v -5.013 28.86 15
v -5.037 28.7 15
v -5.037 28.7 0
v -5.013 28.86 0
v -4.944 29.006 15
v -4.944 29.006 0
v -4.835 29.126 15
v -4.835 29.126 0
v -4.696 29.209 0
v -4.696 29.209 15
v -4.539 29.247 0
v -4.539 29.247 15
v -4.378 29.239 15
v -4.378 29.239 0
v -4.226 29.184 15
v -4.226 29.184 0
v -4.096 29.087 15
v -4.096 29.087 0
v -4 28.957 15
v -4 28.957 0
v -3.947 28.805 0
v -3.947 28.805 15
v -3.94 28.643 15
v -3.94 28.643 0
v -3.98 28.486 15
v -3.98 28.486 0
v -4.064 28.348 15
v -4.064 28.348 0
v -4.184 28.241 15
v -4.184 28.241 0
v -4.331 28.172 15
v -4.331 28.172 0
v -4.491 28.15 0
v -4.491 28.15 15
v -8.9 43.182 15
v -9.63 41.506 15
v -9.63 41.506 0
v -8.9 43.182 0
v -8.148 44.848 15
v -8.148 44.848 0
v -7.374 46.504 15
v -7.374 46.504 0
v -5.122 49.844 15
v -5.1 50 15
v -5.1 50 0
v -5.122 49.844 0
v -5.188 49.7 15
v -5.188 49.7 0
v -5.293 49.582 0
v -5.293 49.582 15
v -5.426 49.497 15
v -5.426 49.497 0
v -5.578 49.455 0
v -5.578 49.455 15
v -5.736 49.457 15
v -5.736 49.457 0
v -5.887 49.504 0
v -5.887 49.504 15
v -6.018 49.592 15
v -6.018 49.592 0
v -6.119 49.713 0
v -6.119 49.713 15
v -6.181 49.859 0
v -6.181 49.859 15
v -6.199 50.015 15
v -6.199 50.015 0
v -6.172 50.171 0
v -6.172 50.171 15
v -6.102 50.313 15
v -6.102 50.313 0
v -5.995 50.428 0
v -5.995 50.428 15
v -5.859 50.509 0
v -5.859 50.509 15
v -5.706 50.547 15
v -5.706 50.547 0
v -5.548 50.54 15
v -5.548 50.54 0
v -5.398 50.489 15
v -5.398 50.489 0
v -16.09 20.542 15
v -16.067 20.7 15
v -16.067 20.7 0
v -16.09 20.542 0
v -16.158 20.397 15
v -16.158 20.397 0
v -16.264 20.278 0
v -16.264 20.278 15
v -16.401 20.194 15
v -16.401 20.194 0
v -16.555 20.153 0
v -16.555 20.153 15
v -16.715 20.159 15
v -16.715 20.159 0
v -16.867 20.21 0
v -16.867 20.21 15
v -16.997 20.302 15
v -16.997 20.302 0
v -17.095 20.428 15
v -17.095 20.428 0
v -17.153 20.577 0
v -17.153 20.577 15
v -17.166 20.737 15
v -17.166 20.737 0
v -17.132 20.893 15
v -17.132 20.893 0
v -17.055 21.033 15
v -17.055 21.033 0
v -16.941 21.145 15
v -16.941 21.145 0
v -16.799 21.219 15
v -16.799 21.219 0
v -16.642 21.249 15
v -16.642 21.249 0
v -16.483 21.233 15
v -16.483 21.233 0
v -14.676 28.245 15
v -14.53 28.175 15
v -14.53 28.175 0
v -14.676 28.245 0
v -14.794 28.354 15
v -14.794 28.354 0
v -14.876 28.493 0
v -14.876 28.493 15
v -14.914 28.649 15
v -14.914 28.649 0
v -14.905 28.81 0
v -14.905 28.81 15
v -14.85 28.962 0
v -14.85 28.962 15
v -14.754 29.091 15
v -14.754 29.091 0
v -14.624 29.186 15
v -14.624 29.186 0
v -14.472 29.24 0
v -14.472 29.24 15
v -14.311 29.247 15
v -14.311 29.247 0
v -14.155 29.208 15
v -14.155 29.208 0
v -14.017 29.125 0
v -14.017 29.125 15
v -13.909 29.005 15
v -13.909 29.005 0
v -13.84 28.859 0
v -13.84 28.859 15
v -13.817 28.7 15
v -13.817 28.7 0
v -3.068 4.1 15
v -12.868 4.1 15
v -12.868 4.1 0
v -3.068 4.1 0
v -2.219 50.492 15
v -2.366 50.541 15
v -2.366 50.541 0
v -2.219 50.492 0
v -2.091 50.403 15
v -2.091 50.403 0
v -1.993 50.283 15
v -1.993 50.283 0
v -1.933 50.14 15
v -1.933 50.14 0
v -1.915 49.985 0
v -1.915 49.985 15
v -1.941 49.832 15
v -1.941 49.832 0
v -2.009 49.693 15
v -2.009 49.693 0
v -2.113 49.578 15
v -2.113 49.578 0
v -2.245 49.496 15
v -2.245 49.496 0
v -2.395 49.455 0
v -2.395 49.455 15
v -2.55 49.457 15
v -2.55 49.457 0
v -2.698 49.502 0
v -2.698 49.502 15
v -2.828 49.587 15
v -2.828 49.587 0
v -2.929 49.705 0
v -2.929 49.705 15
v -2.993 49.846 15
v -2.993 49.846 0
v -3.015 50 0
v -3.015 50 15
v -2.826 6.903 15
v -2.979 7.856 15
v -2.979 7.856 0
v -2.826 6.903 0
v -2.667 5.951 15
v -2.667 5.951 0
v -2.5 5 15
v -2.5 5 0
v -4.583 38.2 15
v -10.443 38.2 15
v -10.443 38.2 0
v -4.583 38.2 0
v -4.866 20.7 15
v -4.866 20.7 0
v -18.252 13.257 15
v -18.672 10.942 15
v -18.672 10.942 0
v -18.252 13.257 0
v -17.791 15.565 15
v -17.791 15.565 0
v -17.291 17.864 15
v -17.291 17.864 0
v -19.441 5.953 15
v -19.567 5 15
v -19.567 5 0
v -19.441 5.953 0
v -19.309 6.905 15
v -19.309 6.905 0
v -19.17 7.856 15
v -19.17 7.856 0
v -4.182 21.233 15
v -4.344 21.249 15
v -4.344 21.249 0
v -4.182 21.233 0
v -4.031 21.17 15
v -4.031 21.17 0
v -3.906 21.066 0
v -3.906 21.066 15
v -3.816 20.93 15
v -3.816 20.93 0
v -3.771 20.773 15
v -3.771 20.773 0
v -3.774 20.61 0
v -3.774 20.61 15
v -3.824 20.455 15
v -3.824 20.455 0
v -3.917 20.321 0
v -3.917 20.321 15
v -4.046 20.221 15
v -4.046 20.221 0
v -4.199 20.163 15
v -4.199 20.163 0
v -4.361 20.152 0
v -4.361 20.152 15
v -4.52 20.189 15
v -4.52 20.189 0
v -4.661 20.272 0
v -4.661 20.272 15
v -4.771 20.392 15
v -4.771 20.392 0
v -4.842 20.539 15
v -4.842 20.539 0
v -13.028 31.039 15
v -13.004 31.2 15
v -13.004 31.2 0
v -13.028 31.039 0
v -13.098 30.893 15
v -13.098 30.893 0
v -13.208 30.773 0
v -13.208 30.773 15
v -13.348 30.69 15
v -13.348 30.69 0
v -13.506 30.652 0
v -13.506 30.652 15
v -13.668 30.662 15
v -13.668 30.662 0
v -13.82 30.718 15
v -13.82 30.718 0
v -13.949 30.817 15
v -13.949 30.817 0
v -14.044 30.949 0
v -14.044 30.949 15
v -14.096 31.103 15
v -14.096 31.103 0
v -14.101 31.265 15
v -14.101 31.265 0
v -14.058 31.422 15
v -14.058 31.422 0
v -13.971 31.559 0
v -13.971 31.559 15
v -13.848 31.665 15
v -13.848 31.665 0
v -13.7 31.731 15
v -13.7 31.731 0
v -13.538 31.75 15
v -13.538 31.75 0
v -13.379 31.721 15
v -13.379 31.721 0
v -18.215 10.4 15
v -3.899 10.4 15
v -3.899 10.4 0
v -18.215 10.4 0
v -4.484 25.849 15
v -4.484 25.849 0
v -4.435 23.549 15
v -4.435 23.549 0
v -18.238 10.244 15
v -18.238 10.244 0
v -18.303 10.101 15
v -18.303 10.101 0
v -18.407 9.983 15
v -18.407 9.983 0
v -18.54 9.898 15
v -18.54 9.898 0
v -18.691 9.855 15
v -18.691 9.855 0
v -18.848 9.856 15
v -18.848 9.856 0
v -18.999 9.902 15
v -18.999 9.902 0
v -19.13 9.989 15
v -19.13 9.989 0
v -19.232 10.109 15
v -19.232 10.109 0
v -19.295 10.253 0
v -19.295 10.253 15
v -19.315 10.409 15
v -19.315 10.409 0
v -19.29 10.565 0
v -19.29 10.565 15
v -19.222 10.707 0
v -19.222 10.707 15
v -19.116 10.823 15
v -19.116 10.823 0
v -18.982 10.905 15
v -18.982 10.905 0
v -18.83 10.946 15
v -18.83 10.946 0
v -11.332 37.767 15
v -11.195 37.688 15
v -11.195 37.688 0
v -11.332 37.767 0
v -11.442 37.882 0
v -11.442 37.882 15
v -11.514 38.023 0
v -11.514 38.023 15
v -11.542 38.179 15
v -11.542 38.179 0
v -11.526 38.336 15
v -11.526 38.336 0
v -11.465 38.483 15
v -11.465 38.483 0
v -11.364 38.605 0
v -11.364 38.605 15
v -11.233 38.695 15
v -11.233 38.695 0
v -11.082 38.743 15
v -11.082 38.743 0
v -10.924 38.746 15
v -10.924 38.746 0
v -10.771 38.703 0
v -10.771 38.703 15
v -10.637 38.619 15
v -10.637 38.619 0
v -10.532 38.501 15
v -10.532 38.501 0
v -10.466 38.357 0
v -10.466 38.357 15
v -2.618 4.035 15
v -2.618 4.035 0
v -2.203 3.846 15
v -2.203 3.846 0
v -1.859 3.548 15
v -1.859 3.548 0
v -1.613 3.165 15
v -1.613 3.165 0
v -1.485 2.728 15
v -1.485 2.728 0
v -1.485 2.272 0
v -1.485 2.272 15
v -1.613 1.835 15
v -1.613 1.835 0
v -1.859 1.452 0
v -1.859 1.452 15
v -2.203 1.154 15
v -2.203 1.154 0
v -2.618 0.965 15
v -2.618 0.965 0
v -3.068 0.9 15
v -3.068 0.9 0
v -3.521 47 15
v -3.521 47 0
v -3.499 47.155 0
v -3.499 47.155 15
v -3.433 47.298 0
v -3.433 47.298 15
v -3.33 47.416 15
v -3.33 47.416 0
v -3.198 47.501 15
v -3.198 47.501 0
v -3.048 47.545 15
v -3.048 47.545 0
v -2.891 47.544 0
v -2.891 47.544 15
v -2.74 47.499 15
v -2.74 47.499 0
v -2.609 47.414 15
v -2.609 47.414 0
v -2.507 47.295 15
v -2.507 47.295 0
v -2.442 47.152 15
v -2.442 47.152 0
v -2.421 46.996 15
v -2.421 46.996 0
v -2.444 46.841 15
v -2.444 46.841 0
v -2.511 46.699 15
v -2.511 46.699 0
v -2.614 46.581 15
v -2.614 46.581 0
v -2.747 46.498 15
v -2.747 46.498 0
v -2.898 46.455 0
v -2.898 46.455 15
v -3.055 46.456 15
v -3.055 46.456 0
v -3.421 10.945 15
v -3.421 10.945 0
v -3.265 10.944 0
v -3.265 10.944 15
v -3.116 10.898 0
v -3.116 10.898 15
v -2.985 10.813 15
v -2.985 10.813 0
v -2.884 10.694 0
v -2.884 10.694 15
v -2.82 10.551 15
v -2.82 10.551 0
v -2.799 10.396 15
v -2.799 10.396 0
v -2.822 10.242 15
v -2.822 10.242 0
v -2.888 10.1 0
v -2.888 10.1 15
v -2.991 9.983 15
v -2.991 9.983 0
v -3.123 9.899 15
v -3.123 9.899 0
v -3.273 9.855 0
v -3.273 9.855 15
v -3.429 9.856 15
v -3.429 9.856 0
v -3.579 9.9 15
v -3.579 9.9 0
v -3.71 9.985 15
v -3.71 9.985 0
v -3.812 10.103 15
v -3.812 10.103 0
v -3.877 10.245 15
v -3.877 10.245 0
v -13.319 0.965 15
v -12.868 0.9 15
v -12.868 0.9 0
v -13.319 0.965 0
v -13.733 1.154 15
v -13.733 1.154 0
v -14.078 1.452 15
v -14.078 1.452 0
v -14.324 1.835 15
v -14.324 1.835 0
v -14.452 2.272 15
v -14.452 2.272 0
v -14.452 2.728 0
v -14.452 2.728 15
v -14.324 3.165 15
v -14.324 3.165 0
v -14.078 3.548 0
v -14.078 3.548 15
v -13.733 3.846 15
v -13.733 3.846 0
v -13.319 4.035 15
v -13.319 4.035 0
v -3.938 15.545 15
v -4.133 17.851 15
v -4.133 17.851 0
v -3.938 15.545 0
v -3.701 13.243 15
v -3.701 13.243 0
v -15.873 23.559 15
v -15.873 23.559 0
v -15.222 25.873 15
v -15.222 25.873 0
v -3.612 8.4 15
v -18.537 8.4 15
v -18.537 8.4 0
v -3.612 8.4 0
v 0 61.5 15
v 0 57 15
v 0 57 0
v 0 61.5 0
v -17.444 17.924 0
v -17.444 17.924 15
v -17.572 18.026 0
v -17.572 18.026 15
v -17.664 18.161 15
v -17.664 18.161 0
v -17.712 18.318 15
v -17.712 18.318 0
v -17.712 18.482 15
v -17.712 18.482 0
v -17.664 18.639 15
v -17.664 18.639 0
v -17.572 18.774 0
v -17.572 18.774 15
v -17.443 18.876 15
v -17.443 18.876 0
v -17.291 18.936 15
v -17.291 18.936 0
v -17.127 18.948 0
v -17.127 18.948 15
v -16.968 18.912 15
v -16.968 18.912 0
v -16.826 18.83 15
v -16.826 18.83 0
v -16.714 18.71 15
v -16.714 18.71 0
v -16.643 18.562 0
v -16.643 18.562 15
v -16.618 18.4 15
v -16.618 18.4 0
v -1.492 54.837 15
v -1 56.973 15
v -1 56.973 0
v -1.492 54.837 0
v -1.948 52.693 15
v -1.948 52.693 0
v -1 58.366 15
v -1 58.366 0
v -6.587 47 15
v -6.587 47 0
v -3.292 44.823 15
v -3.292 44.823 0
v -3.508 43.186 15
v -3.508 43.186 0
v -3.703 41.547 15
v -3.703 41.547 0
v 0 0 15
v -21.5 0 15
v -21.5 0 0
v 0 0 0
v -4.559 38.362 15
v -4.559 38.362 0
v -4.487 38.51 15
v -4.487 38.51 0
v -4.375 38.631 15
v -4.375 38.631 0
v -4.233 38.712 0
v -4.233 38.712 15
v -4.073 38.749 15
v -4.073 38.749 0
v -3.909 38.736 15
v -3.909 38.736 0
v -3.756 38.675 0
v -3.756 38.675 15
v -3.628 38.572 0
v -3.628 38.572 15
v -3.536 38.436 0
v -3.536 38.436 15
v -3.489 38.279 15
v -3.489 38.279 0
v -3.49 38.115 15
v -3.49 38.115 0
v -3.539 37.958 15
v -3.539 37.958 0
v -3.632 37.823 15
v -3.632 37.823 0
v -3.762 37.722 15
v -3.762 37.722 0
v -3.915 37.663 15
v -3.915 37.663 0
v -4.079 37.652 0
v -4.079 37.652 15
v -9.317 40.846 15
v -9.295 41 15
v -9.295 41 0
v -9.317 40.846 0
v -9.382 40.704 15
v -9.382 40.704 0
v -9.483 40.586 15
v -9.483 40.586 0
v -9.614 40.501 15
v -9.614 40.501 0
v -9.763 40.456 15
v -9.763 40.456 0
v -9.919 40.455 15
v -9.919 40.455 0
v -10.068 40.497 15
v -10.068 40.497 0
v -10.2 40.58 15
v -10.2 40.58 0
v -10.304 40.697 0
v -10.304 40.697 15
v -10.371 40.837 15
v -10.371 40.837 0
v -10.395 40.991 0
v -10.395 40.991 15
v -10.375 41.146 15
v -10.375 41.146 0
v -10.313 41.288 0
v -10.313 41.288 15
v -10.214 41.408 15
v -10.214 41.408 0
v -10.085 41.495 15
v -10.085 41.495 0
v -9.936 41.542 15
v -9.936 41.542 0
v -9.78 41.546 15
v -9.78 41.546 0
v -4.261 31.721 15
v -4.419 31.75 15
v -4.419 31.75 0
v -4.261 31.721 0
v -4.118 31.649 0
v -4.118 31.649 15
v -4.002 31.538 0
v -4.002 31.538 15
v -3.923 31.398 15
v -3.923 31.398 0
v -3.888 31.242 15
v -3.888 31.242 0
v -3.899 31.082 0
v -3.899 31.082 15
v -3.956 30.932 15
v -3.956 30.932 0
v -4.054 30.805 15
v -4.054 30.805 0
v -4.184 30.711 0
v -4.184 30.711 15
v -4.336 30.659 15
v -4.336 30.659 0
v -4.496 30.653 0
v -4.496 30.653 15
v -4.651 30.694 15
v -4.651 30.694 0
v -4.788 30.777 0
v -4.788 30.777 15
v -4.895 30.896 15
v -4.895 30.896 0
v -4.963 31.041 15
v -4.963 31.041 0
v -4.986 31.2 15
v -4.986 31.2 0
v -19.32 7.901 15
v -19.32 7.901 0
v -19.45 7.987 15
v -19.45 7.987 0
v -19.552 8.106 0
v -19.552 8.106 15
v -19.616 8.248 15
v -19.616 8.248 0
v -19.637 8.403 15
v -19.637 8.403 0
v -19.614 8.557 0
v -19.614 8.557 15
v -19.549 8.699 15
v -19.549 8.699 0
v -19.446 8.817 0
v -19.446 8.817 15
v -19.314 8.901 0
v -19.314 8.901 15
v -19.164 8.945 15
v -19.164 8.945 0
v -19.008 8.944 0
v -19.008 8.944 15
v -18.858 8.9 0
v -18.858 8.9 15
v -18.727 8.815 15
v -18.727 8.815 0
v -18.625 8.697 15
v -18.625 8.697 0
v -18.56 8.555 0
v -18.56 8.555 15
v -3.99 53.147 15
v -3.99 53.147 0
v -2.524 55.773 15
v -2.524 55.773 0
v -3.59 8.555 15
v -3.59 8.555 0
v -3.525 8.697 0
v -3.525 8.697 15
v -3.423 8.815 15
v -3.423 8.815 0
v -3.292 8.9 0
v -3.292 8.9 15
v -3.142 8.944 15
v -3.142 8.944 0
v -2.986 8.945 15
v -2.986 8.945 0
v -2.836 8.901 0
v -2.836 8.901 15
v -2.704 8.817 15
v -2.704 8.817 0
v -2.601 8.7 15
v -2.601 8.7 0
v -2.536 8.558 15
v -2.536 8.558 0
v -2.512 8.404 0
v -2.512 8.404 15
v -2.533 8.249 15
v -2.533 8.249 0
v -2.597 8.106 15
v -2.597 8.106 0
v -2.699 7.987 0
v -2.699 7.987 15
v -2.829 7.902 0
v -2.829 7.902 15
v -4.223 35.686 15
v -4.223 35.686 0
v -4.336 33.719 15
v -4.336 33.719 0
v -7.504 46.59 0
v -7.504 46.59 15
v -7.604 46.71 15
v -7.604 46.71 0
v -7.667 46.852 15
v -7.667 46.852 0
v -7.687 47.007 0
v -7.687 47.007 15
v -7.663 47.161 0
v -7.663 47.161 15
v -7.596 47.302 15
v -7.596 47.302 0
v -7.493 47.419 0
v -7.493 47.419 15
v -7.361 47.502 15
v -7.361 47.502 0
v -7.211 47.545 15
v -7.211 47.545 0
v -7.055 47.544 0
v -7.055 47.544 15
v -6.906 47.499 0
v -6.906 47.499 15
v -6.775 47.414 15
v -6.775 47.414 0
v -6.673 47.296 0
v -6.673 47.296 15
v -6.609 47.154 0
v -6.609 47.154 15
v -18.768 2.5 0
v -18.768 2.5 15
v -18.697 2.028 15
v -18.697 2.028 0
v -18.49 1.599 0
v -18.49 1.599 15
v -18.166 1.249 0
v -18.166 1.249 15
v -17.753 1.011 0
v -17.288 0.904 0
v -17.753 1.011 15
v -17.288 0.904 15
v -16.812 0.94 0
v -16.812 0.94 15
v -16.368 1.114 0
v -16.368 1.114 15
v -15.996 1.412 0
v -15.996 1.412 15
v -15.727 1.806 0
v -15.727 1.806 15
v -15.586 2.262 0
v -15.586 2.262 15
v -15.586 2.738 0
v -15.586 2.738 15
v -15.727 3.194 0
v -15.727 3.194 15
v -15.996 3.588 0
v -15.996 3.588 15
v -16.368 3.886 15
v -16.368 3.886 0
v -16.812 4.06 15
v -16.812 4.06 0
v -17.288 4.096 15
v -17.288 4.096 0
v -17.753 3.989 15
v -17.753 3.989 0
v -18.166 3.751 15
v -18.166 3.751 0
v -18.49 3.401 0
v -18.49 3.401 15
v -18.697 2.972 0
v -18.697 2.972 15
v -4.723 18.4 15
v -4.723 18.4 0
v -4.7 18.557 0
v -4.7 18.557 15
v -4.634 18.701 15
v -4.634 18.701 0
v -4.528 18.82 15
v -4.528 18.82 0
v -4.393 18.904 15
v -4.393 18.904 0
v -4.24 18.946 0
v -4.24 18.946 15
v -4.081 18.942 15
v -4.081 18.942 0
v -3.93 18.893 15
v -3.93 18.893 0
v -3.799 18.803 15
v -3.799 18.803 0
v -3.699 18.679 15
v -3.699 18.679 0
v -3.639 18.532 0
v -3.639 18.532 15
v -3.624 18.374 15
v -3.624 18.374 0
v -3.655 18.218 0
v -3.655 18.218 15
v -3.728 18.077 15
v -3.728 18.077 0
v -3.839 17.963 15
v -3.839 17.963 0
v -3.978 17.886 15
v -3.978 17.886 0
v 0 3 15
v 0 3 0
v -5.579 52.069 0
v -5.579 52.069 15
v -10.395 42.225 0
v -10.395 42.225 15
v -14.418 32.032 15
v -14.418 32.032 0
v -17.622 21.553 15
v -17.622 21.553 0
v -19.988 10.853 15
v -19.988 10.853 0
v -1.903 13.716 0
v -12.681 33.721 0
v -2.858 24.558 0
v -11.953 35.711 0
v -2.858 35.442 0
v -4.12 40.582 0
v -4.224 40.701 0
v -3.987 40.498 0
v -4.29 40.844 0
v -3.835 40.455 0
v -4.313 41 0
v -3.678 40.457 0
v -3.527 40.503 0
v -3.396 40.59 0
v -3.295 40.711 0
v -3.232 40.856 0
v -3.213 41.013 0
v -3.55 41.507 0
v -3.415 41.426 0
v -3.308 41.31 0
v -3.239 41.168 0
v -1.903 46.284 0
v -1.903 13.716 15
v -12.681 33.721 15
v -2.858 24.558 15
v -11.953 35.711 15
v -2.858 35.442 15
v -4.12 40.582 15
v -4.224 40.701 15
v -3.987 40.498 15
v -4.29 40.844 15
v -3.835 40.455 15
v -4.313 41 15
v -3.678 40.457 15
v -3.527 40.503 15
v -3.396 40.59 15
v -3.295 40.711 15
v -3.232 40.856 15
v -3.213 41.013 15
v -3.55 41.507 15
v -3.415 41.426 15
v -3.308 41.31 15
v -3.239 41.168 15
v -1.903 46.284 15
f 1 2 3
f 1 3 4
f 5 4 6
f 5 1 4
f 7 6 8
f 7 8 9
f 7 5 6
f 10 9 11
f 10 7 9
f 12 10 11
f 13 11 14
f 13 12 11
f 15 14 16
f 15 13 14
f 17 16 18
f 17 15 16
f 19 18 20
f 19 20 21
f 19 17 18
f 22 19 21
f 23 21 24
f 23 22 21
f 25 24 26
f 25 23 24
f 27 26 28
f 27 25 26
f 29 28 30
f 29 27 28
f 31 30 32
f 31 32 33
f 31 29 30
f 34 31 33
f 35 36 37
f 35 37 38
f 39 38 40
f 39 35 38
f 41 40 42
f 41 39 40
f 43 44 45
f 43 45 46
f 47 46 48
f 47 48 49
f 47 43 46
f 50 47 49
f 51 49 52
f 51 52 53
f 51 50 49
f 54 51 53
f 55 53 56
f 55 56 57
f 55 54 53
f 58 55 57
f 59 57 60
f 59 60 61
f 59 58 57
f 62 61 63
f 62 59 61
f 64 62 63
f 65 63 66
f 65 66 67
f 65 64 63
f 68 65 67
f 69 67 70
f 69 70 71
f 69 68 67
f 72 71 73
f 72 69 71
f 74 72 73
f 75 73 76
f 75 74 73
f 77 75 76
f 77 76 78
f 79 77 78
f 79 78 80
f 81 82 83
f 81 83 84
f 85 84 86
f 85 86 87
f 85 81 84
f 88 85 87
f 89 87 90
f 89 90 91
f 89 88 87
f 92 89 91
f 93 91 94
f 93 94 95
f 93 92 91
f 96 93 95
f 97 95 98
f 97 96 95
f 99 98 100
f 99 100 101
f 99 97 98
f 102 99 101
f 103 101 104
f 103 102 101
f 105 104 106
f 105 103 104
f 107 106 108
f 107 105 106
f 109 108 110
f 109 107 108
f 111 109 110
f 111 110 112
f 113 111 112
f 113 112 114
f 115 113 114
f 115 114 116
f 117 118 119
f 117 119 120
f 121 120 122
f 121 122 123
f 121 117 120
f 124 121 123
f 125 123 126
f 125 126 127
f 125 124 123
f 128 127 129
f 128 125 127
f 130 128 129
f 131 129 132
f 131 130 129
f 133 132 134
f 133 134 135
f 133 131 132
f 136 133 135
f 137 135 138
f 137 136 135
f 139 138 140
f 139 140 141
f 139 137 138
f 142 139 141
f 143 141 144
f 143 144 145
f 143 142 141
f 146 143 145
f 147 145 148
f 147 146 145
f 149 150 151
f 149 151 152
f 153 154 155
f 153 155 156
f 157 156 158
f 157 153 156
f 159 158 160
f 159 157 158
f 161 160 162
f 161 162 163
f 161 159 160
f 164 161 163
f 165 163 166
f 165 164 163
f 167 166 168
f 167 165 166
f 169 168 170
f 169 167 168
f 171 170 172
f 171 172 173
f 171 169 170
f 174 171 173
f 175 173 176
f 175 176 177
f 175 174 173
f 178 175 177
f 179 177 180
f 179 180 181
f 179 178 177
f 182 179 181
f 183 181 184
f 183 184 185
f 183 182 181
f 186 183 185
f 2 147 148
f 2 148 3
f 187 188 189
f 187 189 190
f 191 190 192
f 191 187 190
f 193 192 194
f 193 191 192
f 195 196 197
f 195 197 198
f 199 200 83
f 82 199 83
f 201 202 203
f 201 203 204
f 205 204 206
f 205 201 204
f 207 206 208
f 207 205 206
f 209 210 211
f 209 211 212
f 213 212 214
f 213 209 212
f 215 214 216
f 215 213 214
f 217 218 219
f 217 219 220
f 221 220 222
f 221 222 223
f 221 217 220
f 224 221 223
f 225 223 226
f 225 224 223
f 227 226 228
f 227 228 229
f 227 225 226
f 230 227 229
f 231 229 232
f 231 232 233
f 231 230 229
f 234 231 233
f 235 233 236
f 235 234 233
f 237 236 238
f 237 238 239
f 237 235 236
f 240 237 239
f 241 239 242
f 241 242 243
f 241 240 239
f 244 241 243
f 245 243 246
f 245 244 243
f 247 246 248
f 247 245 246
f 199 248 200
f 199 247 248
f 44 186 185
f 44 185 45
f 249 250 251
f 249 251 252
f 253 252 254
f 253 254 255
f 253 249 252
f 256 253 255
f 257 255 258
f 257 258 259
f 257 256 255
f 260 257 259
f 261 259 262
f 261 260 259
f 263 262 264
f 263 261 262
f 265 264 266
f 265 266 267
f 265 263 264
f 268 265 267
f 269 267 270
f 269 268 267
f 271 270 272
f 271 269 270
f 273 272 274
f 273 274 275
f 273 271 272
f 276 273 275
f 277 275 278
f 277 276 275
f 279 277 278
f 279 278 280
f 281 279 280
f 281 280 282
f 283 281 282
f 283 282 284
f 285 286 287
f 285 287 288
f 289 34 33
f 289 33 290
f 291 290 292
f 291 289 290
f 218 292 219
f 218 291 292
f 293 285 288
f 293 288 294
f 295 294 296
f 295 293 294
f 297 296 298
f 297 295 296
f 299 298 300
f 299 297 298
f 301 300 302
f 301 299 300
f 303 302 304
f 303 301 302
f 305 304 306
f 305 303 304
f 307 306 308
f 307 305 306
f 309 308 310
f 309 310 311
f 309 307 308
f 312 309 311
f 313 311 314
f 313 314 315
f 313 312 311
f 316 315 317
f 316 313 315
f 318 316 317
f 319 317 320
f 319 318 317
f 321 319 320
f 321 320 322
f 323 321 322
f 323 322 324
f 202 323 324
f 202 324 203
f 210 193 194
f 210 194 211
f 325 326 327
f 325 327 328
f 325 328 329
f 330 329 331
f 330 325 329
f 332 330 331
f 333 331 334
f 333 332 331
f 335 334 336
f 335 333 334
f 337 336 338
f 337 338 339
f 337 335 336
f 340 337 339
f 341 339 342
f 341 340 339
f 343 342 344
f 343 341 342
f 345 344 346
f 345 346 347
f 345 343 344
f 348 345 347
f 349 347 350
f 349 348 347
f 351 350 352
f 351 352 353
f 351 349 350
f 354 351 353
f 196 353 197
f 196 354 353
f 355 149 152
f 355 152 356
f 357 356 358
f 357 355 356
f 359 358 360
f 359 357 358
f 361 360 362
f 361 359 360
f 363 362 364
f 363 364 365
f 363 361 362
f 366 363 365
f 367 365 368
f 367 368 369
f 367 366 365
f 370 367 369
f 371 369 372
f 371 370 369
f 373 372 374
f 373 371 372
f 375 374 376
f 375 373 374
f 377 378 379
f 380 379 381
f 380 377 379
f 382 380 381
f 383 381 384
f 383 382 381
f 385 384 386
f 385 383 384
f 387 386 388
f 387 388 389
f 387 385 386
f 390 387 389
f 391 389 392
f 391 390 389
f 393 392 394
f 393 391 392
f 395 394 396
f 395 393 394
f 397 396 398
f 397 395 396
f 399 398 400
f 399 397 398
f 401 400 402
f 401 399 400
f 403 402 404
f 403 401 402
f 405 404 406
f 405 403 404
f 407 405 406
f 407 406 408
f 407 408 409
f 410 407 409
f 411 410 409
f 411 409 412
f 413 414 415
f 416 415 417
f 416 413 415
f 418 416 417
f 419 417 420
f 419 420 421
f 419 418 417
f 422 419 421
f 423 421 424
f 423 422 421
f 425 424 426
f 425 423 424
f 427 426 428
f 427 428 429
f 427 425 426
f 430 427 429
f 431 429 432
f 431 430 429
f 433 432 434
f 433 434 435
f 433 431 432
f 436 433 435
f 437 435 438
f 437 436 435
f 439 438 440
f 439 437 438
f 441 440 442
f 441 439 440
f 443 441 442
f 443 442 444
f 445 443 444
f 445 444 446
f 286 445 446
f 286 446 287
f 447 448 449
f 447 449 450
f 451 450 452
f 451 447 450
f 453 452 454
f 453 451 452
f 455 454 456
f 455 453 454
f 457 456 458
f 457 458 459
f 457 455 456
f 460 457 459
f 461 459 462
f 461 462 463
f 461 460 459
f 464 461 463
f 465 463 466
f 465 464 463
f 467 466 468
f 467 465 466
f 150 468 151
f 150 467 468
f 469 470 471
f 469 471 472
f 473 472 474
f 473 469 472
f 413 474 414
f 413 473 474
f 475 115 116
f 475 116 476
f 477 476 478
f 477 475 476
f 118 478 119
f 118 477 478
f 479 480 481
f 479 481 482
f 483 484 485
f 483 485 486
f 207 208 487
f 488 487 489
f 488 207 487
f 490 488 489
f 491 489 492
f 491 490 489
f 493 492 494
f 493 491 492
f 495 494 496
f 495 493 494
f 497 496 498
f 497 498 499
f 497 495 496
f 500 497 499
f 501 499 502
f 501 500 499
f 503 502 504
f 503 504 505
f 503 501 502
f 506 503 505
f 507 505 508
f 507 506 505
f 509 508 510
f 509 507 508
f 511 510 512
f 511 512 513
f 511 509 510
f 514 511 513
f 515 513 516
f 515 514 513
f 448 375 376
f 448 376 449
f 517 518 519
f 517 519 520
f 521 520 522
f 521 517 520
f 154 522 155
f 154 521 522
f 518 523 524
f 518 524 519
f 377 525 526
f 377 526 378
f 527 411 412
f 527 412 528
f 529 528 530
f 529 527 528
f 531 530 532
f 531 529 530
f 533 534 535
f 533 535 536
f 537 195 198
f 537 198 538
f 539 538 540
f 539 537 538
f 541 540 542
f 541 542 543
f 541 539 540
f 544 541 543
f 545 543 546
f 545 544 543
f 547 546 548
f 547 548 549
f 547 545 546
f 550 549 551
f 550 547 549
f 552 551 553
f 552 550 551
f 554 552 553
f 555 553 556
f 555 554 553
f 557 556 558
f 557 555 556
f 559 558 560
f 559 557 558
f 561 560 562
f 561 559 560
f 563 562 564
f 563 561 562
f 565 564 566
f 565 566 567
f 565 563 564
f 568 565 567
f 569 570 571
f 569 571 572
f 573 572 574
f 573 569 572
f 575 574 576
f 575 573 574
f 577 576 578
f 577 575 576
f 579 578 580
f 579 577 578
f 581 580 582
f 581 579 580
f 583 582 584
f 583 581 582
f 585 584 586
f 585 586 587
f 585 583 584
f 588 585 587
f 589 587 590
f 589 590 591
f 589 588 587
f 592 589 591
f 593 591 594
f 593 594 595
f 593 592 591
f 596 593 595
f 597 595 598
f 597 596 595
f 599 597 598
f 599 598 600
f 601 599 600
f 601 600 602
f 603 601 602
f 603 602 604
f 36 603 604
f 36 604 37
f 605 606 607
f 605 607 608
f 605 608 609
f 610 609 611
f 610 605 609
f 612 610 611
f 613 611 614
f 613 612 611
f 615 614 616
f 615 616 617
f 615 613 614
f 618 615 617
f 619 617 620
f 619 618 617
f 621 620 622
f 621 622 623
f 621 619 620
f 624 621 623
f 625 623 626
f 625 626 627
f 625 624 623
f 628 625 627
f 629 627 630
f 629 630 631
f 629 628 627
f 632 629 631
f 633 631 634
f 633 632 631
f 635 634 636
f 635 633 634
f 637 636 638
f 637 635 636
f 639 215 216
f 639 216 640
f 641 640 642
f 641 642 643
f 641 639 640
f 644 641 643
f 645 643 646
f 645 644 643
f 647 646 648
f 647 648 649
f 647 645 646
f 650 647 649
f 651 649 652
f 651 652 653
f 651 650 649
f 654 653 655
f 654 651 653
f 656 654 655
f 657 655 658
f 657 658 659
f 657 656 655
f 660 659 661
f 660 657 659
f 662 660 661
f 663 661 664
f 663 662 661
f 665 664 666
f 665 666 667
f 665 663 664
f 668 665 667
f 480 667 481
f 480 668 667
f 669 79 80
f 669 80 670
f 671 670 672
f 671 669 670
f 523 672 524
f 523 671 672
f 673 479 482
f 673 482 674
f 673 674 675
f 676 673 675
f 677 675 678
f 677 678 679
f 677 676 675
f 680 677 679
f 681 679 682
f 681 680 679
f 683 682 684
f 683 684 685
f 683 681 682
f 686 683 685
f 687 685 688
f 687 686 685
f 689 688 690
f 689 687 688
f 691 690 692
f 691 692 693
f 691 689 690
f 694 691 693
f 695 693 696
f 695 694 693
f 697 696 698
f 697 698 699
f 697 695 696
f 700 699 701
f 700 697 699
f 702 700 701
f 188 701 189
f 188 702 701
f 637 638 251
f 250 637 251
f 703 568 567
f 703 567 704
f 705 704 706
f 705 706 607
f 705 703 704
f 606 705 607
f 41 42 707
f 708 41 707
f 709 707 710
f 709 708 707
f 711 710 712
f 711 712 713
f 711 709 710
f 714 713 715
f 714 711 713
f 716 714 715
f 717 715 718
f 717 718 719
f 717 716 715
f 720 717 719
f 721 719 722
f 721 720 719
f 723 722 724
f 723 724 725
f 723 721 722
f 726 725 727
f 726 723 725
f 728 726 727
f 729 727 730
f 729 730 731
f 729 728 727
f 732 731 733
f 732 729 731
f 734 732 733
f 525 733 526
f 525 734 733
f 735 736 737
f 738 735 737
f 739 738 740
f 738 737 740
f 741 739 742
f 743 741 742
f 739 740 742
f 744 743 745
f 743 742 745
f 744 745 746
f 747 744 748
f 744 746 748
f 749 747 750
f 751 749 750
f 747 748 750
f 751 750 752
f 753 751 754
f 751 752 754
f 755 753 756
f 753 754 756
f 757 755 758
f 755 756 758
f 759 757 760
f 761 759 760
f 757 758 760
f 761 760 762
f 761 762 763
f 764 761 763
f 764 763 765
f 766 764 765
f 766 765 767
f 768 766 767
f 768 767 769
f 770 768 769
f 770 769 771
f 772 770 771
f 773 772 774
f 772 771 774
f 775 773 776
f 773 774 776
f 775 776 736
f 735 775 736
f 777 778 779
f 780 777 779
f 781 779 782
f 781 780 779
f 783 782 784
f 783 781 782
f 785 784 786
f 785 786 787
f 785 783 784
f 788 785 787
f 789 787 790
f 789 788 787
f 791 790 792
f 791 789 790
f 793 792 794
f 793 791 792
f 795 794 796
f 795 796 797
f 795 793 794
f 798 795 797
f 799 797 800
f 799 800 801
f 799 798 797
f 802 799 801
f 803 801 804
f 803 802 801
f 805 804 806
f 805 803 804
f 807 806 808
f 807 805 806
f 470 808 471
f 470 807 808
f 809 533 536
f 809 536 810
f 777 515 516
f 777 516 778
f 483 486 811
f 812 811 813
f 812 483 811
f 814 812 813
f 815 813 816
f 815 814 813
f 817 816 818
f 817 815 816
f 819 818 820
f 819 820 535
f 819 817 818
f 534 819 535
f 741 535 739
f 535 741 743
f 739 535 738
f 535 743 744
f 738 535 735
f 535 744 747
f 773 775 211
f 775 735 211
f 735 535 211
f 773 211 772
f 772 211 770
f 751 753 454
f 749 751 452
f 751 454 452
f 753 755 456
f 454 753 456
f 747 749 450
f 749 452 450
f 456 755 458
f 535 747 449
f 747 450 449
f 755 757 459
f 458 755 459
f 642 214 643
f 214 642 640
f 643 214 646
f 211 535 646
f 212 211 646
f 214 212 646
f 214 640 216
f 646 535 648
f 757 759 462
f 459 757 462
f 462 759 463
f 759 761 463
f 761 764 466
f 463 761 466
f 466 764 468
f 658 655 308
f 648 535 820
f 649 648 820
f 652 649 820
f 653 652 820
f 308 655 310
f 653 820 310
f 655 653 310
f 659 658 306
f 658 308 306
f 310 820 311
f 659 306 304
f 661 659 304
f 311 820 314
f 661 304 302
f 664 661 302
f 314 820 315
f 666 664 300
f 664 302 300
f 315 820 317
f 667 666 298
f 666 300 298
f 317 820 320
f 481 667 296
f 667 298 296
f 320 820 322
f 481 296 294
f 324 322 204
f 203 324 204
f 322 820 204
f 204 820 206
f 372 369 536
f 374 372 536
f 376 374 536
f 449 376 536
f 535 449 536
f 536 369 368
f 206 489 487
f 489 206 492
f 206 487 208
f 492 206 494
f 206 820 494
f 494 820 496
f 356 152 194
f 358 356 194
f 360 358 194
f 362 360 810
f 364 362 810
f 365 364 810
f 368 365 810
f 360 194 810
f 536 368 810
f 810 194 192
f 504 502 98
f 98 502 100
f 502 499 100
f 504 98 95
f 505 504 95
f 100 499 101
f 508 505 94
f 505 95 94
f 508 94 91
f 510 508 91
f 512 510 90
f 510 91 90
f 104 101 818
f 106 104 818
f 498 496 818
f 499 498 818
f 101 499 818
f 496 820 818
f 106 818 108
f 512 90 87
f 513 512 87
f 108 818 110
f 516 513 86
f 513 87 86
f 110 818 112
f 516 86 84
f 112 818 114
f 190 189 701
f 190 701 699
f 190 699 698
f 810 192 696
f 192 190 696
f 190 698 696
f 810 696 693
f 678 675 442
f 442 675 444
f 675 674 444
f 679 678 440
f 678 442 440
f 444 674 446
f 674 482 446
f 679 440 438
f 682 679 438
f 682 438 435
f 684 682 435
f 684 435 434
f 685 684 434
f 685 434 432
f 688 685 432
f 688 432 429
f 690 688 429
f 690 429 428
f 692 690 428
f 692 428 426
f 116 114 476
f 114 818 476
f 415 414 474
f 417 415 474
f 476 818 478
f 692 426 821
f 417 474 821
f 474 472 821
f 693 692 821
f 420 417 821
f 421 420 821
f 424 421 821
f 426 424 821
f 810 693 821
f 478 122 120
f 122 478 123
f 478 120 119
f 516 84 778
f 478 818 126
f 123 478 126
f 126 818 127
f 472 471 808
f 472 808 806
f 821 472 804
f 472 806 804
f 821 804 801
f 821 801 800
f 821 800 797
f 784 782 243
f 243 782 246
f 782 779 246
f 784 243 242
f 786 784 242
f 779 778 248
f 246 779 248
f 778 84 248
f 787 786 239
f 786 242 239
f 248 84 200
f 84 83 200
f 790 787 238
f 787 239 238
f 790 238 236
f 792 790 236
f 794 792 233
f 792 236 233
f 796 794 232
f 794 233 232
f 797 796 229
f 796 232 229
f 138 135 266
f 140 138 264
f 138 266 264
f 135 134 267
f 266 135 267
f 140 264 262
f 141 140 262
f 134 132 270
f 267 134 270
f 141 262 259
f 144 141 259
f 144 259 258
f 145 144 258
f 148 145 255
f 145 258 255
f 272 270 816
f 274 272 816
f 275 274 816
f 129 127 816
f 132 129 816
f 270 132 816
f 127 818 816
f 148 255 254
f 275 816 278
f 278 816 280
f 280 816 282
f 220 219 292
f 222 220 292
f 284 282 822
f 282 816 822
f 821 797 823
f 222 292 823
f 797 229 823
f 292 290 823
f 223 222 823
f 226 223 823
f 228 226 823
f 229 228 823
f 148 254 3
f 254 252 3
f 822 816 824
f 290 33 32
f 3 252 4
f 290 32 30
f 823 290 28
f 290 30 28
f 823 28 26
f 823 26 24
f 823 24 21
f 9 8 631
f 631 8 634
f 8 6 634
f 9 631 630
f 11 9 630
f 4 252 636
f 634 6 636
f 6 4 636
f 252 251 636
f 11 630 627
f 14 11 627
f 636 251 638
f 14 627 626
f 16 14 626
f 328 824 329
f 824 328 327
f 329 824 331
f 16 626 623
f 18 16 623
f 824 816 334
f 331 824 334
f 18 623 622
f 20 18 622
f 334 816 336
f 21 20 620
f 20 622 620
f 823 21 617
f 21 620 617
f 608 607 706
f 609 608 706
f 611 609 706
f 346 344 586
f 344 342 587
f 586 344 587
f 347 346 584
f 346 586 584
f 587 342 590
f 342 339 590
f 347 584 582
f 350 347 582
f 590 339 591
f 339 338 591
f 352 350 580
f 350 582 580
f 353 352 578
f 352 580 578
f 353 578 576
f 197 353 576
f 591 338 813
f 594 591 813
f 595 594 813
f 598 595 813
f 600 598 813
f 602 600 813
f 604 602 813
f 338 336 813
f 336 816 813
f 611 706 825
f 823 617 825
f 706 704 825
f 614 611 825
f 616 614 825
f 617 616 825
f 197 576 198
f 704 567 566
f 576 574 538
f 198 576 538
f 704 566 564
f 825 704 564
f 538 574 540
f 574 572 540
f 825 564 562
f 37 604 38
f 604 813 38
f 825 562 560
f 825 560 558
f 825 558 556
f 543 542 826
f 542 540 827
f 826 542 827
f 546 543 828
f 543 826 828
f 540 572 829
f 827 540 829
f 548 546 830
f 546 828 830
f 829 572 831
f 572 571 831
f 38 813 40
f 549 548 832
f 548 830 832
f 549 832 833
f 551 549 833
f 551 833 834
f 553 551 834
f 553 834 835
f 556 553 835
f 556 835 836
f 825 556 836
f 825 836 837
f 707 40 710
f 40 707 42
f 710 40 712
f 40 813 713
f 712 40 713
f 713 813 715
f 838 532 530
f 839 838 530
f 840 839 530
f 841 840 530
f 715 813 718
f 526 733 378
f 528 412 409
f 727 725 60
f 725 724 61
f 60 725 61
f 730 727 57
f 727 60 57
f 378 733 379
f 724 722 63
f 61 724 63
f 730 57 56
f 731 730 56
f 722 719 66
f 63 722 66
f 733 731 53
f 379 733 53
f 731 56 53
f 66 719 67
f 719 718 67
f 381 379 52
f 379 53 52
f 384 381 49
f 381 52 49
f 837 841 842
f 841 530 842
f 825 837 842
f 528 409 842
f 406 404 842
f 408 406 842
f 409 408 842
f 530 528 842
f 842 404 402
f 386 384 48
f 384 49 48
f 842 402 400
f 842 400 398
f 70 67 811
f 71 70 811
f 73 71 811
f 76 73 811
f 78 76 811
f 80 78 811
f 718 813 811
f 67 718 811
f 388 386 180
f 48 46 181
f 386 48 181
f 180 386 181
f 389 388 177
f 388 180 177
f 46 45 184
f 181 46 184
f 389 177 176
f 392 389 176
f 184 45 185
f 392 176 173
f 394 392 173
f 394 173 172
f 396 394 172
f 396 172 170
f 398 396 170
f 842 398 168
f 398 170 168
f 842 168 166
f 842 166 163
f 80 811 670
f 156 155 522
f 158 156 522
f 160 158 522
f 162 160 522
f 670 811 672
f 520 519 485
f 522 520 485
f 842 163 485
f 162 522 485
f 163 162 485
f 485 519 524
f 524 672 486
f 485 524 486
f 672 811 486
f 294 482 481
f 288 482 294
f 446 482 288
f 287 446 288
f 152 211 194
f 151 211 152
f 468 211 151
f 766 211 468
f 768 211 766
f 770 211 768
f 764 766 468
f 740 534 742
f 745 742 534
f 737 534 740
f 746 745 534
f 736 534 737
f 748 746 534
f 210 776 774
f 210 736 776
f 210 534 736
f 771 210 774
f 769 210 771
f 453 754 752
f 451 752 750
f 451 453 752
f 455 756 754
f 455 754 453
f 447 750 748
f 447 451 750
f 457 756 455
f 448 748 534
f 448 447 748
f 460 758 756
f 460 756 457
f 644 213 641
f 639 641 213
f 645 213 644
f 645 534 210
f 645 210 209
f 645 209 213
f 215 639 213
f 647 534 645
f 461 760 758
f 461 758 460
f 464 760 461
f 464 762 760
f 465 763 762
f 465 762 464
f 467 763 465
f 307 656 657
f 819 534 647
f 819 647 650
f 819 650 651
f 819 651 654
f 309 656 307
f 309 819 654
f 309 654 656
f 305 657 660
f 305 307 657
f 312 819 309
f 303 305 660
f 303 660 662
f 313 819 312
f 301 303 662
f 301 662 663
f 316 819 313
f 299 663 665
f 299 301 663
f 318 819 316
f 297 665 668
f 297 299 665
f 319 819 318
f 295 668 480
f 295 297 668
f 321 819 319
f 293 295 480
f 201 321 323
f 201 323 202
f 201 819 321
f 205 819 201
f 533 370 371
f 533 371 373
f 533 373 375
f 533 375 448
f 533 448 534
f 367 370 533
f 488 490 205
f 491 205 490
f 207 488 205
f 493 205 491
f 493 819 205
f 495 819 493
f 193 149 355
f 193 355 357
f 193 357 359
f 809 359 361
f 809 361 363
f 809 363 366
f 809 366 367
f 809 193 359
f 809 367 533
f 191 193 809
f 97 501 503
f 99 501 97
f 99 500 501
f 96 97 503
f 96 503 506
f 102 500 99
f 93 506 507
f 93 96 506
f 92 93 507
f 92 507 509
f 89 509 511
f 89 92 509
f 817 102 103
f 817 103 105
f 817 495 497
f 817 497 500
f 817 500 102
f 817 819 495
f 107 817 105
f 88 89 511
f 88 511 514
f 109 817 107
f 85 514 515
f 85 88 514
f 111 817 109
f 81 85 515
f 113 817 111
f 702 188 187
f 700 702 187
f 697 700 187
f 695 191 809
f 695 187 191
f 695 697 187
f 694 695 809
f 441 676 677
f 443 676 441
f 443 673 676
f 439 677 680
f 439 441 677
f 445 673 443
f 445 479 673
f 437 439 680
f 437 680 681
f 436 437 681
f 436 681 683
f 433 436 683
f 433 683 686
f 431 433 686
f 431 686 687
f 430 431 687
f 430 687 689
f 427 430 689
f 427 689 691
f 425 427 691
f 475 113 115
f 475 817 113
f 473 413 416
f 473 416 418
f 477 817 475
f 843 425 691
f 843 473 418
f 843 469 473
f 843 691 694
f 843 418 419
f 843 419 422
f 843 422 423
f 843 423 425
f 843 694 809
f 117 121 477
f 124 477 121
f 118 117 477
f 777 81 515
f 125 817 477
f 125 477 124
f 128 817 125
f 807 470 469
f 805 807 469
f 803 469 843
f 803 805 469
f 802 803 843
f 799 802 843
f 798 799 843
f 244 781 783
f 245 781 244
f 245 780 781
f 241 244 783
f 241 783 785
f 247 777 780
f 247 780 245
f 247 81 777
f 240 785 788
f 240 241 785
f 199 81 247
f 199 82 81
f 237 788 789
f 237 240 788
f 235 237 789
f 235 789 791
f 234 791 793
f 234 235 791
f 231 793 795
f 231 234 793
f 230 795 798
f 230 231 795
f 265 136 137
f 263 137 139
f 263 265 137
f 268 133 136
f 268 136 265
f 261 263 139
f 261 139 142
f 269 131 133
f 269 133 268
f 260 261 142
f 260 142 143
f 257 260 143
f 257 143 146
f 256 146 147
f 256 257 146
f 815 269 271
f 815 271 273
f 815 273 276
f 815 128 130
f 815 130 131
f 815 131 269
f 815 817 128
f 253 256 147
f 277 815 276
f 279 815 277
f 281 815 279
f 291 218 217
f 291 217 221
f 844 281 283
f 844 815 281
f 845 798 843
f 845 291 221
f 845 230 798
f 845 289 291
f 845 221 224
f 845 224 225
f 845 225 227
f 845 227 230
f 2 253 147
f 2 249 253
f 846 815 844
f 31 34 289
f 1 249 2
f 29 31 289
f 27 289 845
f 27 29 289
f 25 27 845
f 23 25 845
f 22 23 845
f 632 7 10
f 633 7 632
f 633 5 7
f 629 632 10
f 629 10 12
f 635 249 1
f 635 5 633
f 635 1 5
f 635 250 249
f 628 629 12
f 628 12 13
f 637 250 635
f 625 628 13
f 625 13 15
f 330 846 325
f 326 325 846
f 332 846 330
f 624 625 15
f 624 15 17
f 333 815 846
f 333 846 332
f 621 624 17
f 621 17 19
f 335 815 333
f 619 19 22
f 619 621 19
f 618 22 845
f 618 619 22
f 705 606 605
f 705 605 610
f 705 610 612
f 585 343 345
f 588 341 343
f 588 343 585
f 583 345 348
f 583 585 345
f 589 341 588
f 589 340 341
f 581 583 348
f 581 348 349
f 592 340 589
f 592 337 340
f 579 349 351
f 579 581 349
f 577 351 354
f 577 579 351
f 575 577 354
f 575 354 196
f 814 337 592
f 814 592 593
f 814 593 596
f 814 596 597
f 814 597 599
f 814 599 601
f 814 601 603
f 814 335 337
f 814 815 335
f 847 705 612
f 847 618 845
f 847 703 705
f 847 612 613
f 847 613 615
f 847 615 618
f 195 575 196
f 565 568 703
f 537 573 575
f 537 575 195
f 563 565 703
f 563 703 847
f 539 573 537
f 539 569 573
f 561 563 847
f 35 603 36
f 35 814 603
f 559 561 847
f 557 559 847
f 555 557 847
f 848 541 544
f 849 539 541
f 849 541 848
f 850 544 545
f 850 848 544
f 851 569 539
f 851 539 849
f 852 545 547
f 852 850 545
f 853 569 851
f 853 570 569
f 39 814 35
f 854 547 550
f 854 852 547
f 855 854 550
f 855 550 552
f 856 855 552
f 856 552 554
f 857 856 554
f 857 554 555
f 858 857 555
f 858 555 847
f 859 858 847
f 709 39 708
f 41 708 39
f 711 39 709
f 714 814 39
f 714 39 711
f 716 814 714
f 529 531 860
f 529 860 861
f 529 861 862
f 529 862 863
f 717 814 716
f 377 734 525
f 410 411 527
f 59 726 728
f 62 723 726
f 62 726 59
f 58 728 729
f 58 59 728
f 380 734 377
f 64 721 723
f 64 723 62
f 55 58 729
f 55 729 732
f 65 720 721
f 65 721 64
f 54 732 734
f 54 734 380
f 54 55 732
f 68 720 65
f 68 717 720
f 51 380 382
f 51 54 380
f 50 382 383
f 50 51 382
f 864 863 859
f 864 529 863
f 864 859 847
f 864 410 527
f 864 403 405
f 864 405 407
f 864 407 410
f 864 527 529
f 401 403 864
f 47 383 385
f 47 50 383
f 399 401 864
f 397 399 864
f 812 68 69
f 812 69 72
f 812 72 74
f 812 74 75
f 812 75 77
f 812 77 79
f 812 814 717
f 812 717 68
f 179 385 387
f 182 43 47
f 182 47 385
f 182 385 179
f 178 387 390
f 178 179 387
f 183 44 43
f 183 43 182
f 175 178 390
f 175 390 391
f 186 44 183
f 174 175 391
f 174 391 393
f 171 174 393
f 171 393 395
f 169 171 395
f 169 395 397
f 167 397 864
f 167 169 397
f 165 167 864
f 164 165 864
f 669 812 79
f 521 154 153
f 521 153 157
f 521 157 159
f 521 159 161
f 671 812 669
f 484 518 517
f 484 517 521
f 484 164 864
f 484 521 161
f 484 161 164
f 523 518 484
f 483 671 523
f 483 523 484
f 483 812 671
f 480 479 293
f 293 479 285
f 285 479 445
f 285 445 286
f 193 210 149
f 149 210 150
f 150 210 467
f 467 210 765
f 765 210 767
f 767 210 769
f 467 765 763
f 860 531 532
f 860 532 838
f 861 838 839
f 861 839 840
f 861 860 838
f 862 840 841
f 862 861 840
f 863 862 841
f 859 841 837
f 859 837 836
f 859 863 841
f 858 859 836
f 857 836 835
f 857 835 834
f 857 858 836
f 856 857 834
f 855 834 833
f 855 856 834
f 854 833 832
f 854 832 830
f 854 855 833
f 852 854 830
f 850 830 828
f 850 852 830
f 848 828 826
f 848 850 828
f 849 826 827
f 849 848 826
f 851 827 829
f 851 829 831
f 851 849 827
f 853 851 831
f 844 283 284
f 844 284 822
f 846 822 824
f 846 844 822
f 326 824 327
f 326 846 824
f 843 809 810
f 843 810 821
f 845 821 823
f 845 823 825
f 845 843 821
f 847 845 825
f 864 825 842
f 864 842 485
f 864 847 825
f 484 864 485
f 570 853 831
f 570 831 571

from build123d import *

# Parameters (mm, degrees)
ESQUISSE1_R        = 1.6
BOSS_EXTRU_1_DEPTH = 15


with BuildPart() as part:
    # Esquisse1 → Boss.-Extru.1 (new body)
    with BuildSketch(Plane.XY.offset(15)):
        with BuildLine():
            Line((0, 57), (0, 61.5))
            ThreePointArc((0, 61.5), (-14.418041681, 32.032323515), (-21.5, 0))
            Line((-21.5, 0), (0, 0))
            Line((0, 0), (0, 3))
            ThreePointArc((0, 3), (-2.977286407, 30), (0, 57))
        make_face()
        with Locations(Location((-17.168486885, 2.5, 0), (0, 0, 180))):
            Circle(ESQUISSE1_R, mode=Mode.SUBTRACT)
        with BuildLine():
            Line((-4.312692911, 41), (-9.295115102, 41))
            ThreePointArc((-9.295115102, 41), (-10.303844451, 40.696573922), (-9.629905592, 41.50614708))
            ThreePointArc((-9.629905592, 41.50614708), (-8.526904057, 44.016241784), (-7.373977837, 46.503800615))
            ThreePointArc((-7.373977837, 46.503800615), (-7.430000368, 47.465288022), (-6.586730771, 47))
            Line((-6.586730771, 47), (-3.520929736, 47))
            ThreePointArc((-3.520929736, 47), (-2.553456769, 47.358073068), (-3.054688564, 46.456415178))
            ThreePointArc((-3.054688564, 46.456415178), (-3.40258545, 44.004720773), (-3.702576558, 41.546704695))
            ThreePointArc((-3.702576558, 41.546704695), (-3.3956534, 40.590387992), (-4.312692911, 41))
        make_face(mode=Mode.SUBTRACT)
        with BuildLine():
            Line((-10.442809639, 38.2), (-4.583085107, 38.2))
            ThreePointArc((-4.583085107, 38.2), (-3.628372615, 38.572434959), (-4.078693111, 37.651894253))
            ThreePointArc((-4.078693111, 37.651894253), (-4.283108767, 34.702786262), (-4.418771813, 31.7497168))
            ThreePointArc((-4.418771813, 31.7497168), (-4.053800983, 30.804901148), (-4.986419458, 31.2))
            Line((-4.986419458, 31.2), (-13.004497683, 31.2))
            ThreePointArc((-13.004497683, 31.2), (-14.001308767, 30.879282281), (-13.378533522, 31.721091752))
            ThreePointArc((-13.378533522, 31.721091752), (-12.321188046, 34.717395466), (-11.194758267, 37.688417405))
            ThreePointArc((-11.194758267, 37.688417405), (-11.302186638, 38.654737147), (-10.442809639, 38.2))
        make_face(mode=Mode.SUBTRACT)
        with BuildLine():
            Line((-3.015101171, 50), (-5.099632839, 50))
            ThreePointArc((-5.099632839, 50), (-6.119039194, 49.7133684), (-5.398388017, 50.489260707))
            ThreePointArc((-5.398388017, 50.489260707), (-3.263933011, 54.463678409), (-1, 58.365793421))
            Line((-1, 58.365793421), (-1, 56.97280273))
            ThreePointArc((-1, 56.97280273), (-1.724659998, 53.765748342), (-2.365989319, 50.540996156))
            ThreePointArc((-2.365989319, 50.540996156), (-2.112973011, 49.577500581), (-3.015101171, 50))
        make_face(mode=Mode.SUBTRACT)
        with BuildLine():
            Line((-3.89894146, 10.4), (-18.215006404, 10.4))
            ThreePointArc((-18.215006404, 10.4), (-19.185396456, 10.045356229), (-18.672359875, 10.942140776))
            ThreePointArc((-18.672359875, 10.942140776), (-18.026202705, 14.411865345), (-17.291034109, 17.863826355))
            ThreePointArc((-17.291034109, 17.863826355), (-17.51134183, 18.830058701), (-16.618486885, 18.4))
            Line((-16.618486885, 18.4), (-4.723453535, 18.4))
            ThreePointArc((-4.723453535, 18.4), (-3.799031061, 18.802874436), (-4.133243311, 17.851471844))
            ThreePointArc((-4.133243311, 17.851471844), (-3.82459023, 14.393466491), (-3.421455125, 10.945198834))
            ThreePointArc((-3.421455125, 10.945198834), (-2.935188807, 10.037634519), (-3.89894146, 10.4))
        make_face(mode=Mode.SUBTRACT)
        with BuildLine():
            Line((-13.816577523, 28.7), (-5.036607306, 28.7))
            ThreePointArc((-5.036607306, 28.7), (-4.096135841, 29.087339689), (-4.491036271, 28.150017833))
            ThreePointArc((-4.491036271, 28.150017833), (-4.464411374, 24.698655463), (-4.343932147, 21.249293805))
            ThreePointArc((-4.343932147, 21.249293805), (-3.917431797, 20.321070157), (-4.866069695, 20.7))
            Line((-4.866069695, 20.7), (-16.067033334, 20.7))
            ThreePointArc((-16.067033334, 20.7), (-17.050709214, 20.361732013), (-16.483125083, 21.233449698))
            ThreePointArc((-16.483125083, 21.233449698), (-15.552375348, 24.717038741), (-14.53042622, 28.174972758))
            ThreePointArc((-14.53042622, 28.174972758), (-14.692448063, 29.143067028), (-13.816577523, 28.7))
        make_face(mode=Mode.SUBTRACT)
        with BuildLine():
            Line((-18.53749956, 8.4), (-3.612290325, 8.4))
            ThreePointArc((-3.612290325, 8.4), (-2.704133874, 8.817401433), (-2.978748665, 7.85638176))
            ThreePointArc((-2.978748665, 7.85638176), (-2.747523602, 6.426825008), (-2.5, 5))
            Line((-2.5, 5), (-19.566563167, 5))
            ThreePointArc((-19.566563167, 5), (-19.375761002, 6.429149671), (-19.169954701, 7.856215898))
            ThreePointArc((-19.169954701, 7.856215898), (-19.446072894, 8.81704336), (-18.53749956, 8.4))
        make_face(mode=Mode.SUBTRACT)
        with BuildLine():
            Line((-3.068400716, 0.9), (-12.868400716, 0.9))
            ThreePointArc((-12.868400716, 0.9), (-14.468400716, 2.5), (-12.868400716, 4.1))
            Line((-12.868400716, 4.1), (-3.068400716, 4.1))
            ThreePointArc((-3.068400716, 4.1), (-1.468400716, 2.5), (-3.068400716, 0.9))
        make_face(mode=Mode.SUBTRACT)
    extrude(amount=-BOSS_EXTRU_1_DEPTH)


solid = part.part
